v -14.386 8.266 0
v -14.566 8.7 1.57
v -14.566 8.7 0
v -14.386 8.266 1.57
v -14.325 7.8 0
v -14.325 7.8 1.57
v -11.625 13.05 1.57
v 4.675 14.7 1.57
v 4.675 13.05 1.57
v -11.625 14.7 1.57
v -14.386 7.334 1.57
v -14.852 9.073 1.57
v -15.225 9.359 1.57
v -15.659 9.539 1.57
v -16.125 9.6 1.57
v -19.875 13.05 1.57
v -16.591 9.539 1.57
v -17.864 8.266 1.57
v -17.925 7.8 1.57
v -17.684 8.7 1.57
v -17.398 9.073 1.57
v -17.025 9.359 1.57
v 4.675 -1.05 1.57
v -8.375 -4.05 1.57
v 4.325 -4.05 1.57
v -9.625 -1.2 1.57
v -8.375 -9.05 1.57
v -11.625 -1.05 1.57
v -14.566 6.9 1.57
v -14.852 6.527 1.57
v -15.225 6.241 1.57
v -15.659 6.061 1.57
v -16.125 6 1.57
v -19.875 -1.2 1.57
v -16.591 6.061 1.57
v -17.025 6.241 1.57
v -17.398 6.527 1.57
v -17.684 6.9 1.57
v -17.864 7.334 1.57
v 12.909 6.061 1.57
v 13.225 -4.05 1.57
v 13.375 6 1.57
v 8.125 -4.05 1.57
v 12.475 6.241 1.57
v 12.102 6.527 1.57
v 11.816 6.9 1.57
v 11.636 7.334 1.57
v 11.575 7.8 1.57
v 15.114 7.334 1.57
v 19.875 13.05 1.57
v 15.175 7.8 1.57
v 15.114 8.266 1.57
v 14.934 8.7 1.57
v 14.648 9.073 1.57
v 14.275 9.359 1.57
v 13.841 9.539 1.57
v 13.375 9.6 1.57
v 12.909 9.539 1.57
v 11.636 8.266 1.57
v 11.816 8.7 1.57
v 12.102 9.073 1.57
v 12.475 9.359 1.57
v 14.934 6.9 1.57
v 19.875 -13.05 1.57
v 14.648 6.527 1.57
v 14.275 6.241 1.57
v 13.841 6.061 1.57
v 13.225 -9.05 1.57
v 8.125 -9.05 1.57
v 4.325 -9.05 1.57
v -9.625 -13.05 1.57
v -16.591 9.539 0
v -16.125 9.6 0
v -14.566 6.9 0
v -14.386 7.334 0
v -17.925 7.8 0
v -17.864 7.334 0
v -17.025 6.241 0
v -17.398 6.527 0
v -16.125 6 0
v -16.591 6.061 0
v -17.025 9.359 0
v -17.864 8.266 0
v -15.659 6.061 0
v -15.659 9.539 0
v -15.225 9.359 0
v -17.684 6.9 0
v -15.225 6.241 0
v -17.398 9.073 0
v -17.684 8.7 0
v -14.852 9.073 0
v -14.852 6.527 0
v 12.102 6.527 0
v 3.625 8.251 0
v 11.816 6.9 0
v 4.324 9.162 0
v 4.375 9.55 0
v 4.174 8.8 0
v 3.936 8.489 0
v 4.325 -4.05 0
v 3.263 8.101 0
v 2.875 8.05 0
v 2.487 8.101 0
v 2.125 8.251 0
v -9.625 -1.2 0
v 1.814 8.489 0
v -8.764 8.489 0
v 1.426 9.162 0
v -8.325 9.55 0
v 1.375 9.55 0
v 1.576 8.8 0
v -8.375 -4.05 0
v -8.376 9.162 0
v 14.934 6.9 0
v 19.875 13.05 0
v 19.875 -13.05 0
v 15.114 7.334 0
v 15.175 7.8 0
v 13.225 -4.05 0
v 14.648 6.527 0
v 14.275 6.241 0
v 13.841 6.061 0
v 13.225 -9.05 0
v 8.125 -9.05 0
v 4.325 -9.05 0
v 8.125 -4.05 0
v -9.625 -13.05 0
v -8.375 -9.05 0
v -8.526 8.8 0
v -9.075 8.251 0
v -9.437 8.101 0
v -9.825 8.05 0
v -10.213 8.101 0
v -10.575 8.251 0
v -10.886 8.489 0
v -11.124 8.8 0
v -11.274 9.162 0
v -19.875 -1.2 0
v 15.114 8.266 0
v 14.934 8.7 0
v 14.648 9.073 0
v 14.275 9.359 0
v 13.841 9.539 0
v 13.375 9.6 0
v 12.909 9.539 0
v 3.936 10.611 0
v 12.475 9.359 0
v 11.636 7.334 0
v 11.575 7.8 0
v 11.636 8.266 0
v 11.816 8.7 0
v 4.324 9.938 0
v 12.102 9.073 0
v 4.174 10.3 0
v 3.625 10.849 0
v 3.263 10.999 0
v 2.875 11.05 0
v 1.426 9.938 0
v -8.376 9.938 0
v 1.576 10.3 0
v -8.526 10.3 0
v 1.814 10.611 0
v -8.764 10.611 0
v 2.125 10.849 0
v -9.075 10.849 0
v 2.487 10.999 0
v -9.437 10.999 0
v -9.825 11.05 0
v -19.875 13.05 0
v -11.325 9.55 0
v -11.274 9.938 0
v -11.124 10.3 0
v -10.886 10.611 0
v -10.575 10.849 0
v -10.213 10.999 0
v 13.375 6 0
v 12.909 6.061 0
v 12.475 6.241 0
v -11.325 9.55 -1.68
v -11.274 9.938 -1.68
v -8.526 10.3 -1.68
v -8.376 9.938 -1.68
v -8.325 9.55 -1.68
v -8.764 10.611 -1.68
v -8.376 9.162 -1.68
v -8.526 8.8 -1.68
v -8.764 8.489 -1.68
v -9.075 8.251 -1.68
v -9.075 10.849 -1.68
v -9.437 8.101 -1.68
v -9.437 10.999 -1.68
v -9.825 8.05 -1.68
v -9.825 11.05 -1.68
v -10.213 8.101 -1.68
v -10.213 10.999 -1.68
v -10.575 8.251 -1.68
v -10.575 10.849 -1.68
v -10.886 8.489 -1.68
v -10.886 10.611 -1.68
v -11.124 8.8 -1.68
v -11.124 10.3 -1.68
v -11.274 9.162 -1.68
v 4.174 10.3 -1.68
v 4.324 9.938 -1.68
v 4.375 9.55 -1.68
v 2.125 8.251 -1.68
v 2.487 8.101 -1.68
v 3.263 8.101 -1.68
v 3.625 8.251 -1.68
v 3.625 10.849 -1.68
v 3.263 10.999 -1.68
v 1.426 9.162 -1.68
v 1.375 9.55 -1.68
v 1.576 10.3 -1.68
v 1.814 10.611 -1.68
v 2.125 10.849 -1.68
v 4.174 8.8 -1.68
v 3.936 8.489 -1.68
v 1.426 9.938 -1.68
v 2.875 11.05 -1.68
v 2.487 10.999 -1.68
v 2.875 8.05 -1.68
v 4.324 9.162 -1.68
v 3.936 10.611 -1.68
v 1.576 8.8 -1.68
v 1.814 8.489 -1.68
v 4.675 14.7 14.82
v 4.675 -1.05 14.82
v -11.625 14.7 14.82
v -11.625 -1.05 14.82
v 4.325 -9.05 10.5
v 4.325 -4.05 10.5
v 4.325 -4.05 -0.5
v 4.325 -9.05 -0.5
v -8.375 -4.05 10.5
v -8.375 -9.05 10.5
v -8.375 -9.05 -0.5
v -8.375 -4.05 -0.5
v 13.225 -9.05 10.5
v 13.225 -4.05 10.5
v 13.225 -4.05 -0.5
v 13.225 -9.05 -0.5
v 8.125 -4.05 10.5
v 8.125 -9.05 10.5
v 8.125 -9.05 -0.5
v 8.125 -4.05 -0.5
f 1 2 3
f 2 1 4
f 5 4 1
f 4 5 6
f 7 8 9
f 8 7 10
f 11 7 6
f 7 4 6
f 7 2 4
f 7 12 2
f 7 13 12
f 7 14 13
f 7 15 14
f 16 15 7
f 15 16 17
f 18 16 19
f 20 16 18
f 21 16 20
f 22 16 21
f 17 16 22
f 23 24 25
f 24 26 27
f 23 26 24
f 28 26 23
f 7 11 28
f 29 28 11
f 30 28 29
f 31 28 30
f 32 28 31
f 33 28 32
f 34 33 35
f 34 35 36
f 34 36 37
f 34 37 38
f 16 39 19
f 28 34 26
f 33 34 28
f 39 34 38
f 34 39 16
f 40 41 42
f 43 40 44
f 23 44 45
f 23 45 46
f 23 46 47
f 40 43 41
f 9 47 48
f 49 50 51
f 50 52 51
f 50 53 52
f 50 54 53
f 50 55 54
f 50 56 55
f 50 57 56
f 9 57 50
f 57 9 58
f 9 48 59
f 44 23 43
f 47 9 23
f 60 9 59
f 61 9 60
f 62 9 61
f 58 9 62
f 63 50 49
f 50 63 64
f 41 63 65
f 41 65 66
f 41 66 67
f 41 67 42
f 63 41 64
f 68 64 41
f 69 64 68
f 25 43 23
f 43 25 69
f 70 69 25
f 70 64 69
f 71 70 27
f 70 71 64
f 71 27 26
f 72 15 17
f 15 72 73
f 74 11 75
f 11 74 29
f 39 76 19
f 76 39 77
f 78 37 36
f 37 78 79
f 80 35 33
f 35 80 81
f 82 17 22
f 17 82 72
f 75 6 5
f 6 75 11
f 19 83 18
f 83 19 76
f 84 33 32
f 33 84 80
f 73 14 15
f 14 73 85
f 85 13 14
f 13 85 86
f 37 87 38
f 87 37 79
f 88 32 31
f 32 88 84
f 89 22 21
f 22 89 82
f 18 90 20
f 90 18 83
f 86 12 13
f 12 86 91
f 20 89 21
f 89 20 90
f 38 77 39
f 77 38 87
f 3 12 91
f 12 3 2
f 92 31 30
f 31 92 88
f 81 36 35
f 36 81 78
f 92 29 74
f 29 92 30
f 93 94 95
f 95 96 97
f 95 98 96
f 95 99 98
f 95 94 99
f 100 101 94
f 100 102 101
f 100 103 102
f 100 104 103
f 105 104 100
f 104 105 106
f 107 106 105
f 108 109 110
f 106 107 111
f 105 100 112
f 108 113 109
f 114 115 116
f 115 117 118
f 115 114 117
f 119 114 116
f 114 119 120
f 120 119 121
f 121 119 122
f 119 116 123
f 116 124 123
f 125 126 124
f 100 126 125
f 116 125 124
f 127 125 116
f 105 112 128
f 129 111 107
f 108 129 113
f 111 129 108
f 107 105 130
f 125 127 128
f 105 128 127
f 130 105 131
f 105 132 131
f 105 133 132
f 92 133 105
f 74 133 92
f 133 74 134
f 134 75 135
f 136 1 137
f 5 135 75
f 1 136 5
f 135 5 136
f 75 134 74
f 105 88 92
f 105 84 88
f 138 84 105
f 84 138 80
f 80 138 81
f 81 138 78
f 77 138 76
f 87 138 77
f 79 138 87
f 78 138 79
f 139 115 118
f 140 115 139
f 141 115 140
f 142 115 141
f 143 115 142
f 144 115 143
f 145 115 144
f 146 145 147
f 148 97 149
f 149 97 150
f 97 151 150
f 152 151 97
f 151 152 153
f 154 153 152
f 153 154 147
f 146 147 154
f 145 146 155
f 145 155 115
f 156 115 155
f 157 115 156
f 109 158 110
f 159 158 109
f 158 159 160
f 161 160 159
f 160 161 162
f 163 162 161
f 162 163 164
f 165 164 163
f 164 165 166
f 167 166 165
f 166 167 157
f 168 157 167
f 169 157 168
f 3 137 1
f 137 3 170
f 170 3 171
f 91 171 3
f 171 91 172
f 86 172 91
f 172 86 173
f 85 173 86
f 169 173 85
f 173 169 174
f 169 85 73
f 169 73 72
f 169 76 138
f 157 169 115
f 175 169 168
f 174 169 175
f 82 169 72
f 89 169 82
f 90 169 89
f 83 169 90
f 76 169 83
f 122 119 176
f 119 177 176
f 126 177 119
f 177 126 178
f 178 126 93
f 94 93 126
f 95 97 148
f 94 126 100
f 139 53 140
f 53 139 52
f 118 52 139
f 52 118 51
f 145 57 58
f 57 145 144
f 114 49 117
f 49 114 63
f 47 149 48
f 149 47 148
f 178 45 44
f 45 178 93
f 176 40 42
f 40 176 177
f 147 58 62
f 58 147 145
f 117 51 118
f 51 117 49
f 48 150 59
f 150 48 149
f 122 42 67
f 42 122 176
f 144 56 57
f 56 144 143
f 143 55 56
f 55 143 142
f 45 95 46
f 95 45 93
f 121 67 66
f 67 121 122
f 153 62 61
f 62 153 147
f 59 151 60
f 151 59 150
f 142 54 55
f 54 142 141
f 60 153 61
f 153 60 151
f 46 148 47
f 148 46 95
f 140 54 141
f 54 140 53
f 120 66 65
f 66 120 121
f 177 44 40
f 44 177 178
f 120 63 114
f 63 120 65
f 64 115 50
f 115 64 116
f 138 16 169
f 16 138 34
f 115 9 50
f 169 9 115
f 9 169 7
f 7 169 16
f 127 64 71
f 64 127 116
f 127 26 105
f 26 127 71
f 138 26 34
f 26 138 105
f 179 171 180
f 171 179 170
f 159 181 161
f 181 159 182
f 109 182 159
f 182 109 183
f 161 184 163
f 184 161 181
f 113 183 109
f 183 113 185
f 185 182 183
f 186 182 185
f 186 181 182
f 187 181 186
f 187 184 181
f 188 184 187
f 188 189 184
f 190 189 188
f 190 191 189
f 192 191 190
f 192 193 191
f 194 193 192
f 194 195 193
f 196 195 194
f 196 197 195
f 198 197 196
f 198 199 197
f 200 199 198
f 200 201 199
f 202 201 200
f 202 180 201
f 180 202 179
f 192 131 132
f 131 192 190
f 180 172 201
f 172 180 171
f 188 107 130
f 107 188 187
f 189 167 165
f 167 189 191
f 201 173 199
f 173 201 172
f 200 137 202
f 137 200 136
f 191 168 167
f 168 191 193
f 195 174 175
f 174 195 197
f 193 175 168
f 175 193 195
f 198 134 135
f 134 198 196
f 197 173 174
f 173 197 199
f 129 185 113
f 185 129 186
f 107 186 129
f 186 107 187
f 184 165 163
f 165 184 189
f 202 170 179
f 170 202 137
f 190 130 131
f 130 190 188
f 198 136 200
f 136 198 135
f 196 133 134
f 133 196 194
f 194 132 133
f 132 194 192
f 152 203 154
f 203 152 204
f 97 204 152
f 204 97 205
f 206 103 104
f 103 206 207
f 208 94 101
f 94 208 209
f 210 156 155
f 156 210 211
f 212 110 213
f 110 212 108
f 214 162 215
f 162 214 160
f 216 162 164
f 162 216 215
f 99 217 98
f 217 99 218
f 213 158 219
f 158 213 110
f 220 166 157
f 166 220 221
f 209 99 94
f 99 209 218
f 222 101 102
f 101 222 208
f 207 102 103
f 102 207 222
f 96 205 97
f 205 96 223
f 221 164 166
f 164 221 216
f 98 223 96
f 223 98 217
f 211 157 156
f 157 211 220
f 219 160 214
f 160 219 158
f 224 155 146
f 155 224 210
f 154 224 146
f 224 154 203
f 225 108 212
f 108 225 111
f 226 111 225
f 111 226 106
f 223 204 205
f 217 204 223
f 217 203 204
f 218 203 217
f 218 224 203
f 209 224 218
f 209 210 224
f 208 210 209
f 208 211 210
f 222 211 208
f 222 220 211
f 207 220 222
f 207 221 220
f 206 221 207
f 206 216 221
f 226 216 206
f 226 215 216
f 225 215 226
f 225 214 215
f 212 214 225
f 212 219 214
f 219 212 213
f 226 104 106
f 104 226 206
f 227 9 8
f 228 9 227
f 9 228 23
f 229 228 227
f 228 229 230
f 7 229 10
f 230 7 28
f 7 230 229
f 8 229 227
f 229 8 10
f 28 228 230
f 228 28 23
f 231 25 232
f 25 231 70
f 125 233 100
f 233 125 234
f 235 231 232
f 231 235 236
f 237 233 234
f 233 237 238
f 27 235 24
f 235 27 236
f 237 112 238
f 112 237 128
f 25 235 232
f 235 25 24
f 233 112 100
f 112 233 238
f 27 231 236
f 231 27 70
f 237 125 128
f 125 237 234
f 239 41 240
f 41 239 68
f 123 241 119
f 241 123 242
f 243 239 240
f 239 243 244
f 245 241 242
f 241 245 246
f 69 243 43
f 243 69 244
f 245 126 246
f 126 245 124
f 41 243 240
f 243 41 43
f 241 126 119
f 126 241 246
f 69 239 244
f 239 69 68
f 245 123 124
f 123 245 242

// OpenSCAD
// file: smidge.scad
//
// Copyright (c) Stewart H. Whitman, 2020-2021.
//
// File:    smidge.scad
// Project: General
// License: CC BY-NC-SA 4.0 (Attribution-NonCommercial-ShareAlike)
// Desc:    SMIDGE constant used in preview mode.
//

// Smidge constant for rendering only (to avoid Z-axis fighting, etc.)
SMIDGE = $preview ? 0.01 : 0;
// main file
//
// Copyright (c) Stewart H. Whitman, 2020-2021.
//
// File:    realtek-nic.scad
// Project: Dell Wyse 5070 2nd Ethernet Adapter Adapter
// License: CC BY-NC-SA 4.0 (Attribution-NonCommercial-ShareAlike)
// Desc:    Mock-up of the very common Realtek RTL8111 Daughter Board
//

include <smidge.scad>;

// Common Realtek Mini PCI-Express Daughter board layout
//
// An example would be: IOCREST IO-M2F8111H-GLAN
//
// The problem with these boards are that the cables are
// large and bulk, so the connectors may need changing out to
// right-angle ones.
//

//
// All these values were measured.
//

// kind:
//
// Unique, for customization.
//
function nic_kind() = "realtek";

// PCB thickness ~1.57mm (nominal 4-layer PCB thickness)
// PCB width X length as measured (about 1.5" x 1")
function nic_get_pcb_size() = [ 39.75, 26.1, 1.57 ];

// bottom hole positions [left=0, rear=0]
function _nic_get_left_hole() = [ 3.75, nic_get_pcb_size().y - 5.25];
function _nic_get_right_hole() = [ 33.25, nic_get_pcb_size().y - 5.25];
function nic_get_bottom_holes() = [ _nic_get_left_hole(), _nic_get_right_hole() ];
// bottom hole diameter
function nic_get_bottom_hole_diameter() = 3.6;

// ethernet size [left<->right,front<->rear,top<->bottom]
function nic_get_ethernet_size() = [16.30,15.75,13.25];

// ethernet position measures 8.25mm from left side
function _nic_get_ethernet_left_pos() = 8.25;
function _nic_get_ethernet_right_pos() = _nic_get_ethernet_left_pos()+nic_get_ethernet_size().x;
function _nic_get_ethernet_bottom_pos() = nic_get_pcb_size().z;
function nic_get_ethernet_center_pos() = [ (_nic_get_ethernet_left_pos()+_nic_get_ethernet_right_pos())/2, _nic_get_ethernet_bottom_pos() + nic_get_ethernet_size().z/2 ];
function nic_get_ethernet_projection() = 12.0 + nic_get_ethernet_size().y - nic_get_pcb_size().y;

// shield (none)
function nic_get_shield_thickness() = 0;
function nic_get_shield_size() = [];
function nic_get_shield_hole_diameter() = 0;
function nic_get_shield_holes() = [];
function nic_get_shield_center_pos() = [ 0, 0 ];

// ethernet is equidistant from left or right side (about 7.5mm)
// Layout of the nic board (PCB centered with NIC port hanging out)
module nic(transparency=1.0,center=true,with_shield=true) {

  module hole() {
    translate( [0,0,-SMIDGE] ) cylinder( h = nic_get_pcb_size().z+2*SMIDGE, d=nic_get_bottom_hole_diameter() );
  } // end hole

  // pcb with notch and hole
  module pcb() {
    color( "green", transparency )
      difference() {
	// board
	cube( nic_get_pcb_size() );
	// notch
	translate( [-SMIDGE,-SMIDGE,-SMIDGE] ) cube( nic_get_pcb_size() - [29.5-SMIDGE, 14.25-SMIDGE, -2*SMIDGE] );
        // holes
        for( h = nic_get_bottom_holes() )
	  translate( concat( h, 0 ) ) hole();
      }
  } // end pcb

  module ethernet() {
    color( "silver", transparency )
      translate( [_nic_get_ethernet_left_pos(),12.0,nic_get_pcb_size().z] ) cube( nic_get_ethernet_size() );
    color( "black", transparency ) {
      h = 3.25;
      translate( [_nic_get_ethernet_left_pos()+1.8,nic_get_pcb_size().y-3.5,nic_get_pcb_size().z-h] ) cylinder( h=h, d=3.00 );
      translate( [_nic_get_ethernet_right_pos()-1.8,nic_get_pcb_size().y-3.5,nic_get_pcb_size().z-h] ) cylinder( h=h, d=3.00 );
    }
  } // end ethernet

  module header1() {
    color( "black", transparency )
      translate( [ 11.5, 4, -0.5 ] ) cube( [ 12.7, 5, 11] );
  } // end header1

  module header2() {
    color( "black", transparency )
      translate( [ 28, 4, -0.5 ] ) cube( [ 5.1, 5, 11] );
  } // end header2

  // entire nic
  translate( center ? -[nic_get_pcb_size().x,nic_get_pcb_size().y,0]/2 : [0,0,0] ) {
    pcb();
    ethernet();
    header1();
    header2();
  }
} // end nic

nic($fn=24);
